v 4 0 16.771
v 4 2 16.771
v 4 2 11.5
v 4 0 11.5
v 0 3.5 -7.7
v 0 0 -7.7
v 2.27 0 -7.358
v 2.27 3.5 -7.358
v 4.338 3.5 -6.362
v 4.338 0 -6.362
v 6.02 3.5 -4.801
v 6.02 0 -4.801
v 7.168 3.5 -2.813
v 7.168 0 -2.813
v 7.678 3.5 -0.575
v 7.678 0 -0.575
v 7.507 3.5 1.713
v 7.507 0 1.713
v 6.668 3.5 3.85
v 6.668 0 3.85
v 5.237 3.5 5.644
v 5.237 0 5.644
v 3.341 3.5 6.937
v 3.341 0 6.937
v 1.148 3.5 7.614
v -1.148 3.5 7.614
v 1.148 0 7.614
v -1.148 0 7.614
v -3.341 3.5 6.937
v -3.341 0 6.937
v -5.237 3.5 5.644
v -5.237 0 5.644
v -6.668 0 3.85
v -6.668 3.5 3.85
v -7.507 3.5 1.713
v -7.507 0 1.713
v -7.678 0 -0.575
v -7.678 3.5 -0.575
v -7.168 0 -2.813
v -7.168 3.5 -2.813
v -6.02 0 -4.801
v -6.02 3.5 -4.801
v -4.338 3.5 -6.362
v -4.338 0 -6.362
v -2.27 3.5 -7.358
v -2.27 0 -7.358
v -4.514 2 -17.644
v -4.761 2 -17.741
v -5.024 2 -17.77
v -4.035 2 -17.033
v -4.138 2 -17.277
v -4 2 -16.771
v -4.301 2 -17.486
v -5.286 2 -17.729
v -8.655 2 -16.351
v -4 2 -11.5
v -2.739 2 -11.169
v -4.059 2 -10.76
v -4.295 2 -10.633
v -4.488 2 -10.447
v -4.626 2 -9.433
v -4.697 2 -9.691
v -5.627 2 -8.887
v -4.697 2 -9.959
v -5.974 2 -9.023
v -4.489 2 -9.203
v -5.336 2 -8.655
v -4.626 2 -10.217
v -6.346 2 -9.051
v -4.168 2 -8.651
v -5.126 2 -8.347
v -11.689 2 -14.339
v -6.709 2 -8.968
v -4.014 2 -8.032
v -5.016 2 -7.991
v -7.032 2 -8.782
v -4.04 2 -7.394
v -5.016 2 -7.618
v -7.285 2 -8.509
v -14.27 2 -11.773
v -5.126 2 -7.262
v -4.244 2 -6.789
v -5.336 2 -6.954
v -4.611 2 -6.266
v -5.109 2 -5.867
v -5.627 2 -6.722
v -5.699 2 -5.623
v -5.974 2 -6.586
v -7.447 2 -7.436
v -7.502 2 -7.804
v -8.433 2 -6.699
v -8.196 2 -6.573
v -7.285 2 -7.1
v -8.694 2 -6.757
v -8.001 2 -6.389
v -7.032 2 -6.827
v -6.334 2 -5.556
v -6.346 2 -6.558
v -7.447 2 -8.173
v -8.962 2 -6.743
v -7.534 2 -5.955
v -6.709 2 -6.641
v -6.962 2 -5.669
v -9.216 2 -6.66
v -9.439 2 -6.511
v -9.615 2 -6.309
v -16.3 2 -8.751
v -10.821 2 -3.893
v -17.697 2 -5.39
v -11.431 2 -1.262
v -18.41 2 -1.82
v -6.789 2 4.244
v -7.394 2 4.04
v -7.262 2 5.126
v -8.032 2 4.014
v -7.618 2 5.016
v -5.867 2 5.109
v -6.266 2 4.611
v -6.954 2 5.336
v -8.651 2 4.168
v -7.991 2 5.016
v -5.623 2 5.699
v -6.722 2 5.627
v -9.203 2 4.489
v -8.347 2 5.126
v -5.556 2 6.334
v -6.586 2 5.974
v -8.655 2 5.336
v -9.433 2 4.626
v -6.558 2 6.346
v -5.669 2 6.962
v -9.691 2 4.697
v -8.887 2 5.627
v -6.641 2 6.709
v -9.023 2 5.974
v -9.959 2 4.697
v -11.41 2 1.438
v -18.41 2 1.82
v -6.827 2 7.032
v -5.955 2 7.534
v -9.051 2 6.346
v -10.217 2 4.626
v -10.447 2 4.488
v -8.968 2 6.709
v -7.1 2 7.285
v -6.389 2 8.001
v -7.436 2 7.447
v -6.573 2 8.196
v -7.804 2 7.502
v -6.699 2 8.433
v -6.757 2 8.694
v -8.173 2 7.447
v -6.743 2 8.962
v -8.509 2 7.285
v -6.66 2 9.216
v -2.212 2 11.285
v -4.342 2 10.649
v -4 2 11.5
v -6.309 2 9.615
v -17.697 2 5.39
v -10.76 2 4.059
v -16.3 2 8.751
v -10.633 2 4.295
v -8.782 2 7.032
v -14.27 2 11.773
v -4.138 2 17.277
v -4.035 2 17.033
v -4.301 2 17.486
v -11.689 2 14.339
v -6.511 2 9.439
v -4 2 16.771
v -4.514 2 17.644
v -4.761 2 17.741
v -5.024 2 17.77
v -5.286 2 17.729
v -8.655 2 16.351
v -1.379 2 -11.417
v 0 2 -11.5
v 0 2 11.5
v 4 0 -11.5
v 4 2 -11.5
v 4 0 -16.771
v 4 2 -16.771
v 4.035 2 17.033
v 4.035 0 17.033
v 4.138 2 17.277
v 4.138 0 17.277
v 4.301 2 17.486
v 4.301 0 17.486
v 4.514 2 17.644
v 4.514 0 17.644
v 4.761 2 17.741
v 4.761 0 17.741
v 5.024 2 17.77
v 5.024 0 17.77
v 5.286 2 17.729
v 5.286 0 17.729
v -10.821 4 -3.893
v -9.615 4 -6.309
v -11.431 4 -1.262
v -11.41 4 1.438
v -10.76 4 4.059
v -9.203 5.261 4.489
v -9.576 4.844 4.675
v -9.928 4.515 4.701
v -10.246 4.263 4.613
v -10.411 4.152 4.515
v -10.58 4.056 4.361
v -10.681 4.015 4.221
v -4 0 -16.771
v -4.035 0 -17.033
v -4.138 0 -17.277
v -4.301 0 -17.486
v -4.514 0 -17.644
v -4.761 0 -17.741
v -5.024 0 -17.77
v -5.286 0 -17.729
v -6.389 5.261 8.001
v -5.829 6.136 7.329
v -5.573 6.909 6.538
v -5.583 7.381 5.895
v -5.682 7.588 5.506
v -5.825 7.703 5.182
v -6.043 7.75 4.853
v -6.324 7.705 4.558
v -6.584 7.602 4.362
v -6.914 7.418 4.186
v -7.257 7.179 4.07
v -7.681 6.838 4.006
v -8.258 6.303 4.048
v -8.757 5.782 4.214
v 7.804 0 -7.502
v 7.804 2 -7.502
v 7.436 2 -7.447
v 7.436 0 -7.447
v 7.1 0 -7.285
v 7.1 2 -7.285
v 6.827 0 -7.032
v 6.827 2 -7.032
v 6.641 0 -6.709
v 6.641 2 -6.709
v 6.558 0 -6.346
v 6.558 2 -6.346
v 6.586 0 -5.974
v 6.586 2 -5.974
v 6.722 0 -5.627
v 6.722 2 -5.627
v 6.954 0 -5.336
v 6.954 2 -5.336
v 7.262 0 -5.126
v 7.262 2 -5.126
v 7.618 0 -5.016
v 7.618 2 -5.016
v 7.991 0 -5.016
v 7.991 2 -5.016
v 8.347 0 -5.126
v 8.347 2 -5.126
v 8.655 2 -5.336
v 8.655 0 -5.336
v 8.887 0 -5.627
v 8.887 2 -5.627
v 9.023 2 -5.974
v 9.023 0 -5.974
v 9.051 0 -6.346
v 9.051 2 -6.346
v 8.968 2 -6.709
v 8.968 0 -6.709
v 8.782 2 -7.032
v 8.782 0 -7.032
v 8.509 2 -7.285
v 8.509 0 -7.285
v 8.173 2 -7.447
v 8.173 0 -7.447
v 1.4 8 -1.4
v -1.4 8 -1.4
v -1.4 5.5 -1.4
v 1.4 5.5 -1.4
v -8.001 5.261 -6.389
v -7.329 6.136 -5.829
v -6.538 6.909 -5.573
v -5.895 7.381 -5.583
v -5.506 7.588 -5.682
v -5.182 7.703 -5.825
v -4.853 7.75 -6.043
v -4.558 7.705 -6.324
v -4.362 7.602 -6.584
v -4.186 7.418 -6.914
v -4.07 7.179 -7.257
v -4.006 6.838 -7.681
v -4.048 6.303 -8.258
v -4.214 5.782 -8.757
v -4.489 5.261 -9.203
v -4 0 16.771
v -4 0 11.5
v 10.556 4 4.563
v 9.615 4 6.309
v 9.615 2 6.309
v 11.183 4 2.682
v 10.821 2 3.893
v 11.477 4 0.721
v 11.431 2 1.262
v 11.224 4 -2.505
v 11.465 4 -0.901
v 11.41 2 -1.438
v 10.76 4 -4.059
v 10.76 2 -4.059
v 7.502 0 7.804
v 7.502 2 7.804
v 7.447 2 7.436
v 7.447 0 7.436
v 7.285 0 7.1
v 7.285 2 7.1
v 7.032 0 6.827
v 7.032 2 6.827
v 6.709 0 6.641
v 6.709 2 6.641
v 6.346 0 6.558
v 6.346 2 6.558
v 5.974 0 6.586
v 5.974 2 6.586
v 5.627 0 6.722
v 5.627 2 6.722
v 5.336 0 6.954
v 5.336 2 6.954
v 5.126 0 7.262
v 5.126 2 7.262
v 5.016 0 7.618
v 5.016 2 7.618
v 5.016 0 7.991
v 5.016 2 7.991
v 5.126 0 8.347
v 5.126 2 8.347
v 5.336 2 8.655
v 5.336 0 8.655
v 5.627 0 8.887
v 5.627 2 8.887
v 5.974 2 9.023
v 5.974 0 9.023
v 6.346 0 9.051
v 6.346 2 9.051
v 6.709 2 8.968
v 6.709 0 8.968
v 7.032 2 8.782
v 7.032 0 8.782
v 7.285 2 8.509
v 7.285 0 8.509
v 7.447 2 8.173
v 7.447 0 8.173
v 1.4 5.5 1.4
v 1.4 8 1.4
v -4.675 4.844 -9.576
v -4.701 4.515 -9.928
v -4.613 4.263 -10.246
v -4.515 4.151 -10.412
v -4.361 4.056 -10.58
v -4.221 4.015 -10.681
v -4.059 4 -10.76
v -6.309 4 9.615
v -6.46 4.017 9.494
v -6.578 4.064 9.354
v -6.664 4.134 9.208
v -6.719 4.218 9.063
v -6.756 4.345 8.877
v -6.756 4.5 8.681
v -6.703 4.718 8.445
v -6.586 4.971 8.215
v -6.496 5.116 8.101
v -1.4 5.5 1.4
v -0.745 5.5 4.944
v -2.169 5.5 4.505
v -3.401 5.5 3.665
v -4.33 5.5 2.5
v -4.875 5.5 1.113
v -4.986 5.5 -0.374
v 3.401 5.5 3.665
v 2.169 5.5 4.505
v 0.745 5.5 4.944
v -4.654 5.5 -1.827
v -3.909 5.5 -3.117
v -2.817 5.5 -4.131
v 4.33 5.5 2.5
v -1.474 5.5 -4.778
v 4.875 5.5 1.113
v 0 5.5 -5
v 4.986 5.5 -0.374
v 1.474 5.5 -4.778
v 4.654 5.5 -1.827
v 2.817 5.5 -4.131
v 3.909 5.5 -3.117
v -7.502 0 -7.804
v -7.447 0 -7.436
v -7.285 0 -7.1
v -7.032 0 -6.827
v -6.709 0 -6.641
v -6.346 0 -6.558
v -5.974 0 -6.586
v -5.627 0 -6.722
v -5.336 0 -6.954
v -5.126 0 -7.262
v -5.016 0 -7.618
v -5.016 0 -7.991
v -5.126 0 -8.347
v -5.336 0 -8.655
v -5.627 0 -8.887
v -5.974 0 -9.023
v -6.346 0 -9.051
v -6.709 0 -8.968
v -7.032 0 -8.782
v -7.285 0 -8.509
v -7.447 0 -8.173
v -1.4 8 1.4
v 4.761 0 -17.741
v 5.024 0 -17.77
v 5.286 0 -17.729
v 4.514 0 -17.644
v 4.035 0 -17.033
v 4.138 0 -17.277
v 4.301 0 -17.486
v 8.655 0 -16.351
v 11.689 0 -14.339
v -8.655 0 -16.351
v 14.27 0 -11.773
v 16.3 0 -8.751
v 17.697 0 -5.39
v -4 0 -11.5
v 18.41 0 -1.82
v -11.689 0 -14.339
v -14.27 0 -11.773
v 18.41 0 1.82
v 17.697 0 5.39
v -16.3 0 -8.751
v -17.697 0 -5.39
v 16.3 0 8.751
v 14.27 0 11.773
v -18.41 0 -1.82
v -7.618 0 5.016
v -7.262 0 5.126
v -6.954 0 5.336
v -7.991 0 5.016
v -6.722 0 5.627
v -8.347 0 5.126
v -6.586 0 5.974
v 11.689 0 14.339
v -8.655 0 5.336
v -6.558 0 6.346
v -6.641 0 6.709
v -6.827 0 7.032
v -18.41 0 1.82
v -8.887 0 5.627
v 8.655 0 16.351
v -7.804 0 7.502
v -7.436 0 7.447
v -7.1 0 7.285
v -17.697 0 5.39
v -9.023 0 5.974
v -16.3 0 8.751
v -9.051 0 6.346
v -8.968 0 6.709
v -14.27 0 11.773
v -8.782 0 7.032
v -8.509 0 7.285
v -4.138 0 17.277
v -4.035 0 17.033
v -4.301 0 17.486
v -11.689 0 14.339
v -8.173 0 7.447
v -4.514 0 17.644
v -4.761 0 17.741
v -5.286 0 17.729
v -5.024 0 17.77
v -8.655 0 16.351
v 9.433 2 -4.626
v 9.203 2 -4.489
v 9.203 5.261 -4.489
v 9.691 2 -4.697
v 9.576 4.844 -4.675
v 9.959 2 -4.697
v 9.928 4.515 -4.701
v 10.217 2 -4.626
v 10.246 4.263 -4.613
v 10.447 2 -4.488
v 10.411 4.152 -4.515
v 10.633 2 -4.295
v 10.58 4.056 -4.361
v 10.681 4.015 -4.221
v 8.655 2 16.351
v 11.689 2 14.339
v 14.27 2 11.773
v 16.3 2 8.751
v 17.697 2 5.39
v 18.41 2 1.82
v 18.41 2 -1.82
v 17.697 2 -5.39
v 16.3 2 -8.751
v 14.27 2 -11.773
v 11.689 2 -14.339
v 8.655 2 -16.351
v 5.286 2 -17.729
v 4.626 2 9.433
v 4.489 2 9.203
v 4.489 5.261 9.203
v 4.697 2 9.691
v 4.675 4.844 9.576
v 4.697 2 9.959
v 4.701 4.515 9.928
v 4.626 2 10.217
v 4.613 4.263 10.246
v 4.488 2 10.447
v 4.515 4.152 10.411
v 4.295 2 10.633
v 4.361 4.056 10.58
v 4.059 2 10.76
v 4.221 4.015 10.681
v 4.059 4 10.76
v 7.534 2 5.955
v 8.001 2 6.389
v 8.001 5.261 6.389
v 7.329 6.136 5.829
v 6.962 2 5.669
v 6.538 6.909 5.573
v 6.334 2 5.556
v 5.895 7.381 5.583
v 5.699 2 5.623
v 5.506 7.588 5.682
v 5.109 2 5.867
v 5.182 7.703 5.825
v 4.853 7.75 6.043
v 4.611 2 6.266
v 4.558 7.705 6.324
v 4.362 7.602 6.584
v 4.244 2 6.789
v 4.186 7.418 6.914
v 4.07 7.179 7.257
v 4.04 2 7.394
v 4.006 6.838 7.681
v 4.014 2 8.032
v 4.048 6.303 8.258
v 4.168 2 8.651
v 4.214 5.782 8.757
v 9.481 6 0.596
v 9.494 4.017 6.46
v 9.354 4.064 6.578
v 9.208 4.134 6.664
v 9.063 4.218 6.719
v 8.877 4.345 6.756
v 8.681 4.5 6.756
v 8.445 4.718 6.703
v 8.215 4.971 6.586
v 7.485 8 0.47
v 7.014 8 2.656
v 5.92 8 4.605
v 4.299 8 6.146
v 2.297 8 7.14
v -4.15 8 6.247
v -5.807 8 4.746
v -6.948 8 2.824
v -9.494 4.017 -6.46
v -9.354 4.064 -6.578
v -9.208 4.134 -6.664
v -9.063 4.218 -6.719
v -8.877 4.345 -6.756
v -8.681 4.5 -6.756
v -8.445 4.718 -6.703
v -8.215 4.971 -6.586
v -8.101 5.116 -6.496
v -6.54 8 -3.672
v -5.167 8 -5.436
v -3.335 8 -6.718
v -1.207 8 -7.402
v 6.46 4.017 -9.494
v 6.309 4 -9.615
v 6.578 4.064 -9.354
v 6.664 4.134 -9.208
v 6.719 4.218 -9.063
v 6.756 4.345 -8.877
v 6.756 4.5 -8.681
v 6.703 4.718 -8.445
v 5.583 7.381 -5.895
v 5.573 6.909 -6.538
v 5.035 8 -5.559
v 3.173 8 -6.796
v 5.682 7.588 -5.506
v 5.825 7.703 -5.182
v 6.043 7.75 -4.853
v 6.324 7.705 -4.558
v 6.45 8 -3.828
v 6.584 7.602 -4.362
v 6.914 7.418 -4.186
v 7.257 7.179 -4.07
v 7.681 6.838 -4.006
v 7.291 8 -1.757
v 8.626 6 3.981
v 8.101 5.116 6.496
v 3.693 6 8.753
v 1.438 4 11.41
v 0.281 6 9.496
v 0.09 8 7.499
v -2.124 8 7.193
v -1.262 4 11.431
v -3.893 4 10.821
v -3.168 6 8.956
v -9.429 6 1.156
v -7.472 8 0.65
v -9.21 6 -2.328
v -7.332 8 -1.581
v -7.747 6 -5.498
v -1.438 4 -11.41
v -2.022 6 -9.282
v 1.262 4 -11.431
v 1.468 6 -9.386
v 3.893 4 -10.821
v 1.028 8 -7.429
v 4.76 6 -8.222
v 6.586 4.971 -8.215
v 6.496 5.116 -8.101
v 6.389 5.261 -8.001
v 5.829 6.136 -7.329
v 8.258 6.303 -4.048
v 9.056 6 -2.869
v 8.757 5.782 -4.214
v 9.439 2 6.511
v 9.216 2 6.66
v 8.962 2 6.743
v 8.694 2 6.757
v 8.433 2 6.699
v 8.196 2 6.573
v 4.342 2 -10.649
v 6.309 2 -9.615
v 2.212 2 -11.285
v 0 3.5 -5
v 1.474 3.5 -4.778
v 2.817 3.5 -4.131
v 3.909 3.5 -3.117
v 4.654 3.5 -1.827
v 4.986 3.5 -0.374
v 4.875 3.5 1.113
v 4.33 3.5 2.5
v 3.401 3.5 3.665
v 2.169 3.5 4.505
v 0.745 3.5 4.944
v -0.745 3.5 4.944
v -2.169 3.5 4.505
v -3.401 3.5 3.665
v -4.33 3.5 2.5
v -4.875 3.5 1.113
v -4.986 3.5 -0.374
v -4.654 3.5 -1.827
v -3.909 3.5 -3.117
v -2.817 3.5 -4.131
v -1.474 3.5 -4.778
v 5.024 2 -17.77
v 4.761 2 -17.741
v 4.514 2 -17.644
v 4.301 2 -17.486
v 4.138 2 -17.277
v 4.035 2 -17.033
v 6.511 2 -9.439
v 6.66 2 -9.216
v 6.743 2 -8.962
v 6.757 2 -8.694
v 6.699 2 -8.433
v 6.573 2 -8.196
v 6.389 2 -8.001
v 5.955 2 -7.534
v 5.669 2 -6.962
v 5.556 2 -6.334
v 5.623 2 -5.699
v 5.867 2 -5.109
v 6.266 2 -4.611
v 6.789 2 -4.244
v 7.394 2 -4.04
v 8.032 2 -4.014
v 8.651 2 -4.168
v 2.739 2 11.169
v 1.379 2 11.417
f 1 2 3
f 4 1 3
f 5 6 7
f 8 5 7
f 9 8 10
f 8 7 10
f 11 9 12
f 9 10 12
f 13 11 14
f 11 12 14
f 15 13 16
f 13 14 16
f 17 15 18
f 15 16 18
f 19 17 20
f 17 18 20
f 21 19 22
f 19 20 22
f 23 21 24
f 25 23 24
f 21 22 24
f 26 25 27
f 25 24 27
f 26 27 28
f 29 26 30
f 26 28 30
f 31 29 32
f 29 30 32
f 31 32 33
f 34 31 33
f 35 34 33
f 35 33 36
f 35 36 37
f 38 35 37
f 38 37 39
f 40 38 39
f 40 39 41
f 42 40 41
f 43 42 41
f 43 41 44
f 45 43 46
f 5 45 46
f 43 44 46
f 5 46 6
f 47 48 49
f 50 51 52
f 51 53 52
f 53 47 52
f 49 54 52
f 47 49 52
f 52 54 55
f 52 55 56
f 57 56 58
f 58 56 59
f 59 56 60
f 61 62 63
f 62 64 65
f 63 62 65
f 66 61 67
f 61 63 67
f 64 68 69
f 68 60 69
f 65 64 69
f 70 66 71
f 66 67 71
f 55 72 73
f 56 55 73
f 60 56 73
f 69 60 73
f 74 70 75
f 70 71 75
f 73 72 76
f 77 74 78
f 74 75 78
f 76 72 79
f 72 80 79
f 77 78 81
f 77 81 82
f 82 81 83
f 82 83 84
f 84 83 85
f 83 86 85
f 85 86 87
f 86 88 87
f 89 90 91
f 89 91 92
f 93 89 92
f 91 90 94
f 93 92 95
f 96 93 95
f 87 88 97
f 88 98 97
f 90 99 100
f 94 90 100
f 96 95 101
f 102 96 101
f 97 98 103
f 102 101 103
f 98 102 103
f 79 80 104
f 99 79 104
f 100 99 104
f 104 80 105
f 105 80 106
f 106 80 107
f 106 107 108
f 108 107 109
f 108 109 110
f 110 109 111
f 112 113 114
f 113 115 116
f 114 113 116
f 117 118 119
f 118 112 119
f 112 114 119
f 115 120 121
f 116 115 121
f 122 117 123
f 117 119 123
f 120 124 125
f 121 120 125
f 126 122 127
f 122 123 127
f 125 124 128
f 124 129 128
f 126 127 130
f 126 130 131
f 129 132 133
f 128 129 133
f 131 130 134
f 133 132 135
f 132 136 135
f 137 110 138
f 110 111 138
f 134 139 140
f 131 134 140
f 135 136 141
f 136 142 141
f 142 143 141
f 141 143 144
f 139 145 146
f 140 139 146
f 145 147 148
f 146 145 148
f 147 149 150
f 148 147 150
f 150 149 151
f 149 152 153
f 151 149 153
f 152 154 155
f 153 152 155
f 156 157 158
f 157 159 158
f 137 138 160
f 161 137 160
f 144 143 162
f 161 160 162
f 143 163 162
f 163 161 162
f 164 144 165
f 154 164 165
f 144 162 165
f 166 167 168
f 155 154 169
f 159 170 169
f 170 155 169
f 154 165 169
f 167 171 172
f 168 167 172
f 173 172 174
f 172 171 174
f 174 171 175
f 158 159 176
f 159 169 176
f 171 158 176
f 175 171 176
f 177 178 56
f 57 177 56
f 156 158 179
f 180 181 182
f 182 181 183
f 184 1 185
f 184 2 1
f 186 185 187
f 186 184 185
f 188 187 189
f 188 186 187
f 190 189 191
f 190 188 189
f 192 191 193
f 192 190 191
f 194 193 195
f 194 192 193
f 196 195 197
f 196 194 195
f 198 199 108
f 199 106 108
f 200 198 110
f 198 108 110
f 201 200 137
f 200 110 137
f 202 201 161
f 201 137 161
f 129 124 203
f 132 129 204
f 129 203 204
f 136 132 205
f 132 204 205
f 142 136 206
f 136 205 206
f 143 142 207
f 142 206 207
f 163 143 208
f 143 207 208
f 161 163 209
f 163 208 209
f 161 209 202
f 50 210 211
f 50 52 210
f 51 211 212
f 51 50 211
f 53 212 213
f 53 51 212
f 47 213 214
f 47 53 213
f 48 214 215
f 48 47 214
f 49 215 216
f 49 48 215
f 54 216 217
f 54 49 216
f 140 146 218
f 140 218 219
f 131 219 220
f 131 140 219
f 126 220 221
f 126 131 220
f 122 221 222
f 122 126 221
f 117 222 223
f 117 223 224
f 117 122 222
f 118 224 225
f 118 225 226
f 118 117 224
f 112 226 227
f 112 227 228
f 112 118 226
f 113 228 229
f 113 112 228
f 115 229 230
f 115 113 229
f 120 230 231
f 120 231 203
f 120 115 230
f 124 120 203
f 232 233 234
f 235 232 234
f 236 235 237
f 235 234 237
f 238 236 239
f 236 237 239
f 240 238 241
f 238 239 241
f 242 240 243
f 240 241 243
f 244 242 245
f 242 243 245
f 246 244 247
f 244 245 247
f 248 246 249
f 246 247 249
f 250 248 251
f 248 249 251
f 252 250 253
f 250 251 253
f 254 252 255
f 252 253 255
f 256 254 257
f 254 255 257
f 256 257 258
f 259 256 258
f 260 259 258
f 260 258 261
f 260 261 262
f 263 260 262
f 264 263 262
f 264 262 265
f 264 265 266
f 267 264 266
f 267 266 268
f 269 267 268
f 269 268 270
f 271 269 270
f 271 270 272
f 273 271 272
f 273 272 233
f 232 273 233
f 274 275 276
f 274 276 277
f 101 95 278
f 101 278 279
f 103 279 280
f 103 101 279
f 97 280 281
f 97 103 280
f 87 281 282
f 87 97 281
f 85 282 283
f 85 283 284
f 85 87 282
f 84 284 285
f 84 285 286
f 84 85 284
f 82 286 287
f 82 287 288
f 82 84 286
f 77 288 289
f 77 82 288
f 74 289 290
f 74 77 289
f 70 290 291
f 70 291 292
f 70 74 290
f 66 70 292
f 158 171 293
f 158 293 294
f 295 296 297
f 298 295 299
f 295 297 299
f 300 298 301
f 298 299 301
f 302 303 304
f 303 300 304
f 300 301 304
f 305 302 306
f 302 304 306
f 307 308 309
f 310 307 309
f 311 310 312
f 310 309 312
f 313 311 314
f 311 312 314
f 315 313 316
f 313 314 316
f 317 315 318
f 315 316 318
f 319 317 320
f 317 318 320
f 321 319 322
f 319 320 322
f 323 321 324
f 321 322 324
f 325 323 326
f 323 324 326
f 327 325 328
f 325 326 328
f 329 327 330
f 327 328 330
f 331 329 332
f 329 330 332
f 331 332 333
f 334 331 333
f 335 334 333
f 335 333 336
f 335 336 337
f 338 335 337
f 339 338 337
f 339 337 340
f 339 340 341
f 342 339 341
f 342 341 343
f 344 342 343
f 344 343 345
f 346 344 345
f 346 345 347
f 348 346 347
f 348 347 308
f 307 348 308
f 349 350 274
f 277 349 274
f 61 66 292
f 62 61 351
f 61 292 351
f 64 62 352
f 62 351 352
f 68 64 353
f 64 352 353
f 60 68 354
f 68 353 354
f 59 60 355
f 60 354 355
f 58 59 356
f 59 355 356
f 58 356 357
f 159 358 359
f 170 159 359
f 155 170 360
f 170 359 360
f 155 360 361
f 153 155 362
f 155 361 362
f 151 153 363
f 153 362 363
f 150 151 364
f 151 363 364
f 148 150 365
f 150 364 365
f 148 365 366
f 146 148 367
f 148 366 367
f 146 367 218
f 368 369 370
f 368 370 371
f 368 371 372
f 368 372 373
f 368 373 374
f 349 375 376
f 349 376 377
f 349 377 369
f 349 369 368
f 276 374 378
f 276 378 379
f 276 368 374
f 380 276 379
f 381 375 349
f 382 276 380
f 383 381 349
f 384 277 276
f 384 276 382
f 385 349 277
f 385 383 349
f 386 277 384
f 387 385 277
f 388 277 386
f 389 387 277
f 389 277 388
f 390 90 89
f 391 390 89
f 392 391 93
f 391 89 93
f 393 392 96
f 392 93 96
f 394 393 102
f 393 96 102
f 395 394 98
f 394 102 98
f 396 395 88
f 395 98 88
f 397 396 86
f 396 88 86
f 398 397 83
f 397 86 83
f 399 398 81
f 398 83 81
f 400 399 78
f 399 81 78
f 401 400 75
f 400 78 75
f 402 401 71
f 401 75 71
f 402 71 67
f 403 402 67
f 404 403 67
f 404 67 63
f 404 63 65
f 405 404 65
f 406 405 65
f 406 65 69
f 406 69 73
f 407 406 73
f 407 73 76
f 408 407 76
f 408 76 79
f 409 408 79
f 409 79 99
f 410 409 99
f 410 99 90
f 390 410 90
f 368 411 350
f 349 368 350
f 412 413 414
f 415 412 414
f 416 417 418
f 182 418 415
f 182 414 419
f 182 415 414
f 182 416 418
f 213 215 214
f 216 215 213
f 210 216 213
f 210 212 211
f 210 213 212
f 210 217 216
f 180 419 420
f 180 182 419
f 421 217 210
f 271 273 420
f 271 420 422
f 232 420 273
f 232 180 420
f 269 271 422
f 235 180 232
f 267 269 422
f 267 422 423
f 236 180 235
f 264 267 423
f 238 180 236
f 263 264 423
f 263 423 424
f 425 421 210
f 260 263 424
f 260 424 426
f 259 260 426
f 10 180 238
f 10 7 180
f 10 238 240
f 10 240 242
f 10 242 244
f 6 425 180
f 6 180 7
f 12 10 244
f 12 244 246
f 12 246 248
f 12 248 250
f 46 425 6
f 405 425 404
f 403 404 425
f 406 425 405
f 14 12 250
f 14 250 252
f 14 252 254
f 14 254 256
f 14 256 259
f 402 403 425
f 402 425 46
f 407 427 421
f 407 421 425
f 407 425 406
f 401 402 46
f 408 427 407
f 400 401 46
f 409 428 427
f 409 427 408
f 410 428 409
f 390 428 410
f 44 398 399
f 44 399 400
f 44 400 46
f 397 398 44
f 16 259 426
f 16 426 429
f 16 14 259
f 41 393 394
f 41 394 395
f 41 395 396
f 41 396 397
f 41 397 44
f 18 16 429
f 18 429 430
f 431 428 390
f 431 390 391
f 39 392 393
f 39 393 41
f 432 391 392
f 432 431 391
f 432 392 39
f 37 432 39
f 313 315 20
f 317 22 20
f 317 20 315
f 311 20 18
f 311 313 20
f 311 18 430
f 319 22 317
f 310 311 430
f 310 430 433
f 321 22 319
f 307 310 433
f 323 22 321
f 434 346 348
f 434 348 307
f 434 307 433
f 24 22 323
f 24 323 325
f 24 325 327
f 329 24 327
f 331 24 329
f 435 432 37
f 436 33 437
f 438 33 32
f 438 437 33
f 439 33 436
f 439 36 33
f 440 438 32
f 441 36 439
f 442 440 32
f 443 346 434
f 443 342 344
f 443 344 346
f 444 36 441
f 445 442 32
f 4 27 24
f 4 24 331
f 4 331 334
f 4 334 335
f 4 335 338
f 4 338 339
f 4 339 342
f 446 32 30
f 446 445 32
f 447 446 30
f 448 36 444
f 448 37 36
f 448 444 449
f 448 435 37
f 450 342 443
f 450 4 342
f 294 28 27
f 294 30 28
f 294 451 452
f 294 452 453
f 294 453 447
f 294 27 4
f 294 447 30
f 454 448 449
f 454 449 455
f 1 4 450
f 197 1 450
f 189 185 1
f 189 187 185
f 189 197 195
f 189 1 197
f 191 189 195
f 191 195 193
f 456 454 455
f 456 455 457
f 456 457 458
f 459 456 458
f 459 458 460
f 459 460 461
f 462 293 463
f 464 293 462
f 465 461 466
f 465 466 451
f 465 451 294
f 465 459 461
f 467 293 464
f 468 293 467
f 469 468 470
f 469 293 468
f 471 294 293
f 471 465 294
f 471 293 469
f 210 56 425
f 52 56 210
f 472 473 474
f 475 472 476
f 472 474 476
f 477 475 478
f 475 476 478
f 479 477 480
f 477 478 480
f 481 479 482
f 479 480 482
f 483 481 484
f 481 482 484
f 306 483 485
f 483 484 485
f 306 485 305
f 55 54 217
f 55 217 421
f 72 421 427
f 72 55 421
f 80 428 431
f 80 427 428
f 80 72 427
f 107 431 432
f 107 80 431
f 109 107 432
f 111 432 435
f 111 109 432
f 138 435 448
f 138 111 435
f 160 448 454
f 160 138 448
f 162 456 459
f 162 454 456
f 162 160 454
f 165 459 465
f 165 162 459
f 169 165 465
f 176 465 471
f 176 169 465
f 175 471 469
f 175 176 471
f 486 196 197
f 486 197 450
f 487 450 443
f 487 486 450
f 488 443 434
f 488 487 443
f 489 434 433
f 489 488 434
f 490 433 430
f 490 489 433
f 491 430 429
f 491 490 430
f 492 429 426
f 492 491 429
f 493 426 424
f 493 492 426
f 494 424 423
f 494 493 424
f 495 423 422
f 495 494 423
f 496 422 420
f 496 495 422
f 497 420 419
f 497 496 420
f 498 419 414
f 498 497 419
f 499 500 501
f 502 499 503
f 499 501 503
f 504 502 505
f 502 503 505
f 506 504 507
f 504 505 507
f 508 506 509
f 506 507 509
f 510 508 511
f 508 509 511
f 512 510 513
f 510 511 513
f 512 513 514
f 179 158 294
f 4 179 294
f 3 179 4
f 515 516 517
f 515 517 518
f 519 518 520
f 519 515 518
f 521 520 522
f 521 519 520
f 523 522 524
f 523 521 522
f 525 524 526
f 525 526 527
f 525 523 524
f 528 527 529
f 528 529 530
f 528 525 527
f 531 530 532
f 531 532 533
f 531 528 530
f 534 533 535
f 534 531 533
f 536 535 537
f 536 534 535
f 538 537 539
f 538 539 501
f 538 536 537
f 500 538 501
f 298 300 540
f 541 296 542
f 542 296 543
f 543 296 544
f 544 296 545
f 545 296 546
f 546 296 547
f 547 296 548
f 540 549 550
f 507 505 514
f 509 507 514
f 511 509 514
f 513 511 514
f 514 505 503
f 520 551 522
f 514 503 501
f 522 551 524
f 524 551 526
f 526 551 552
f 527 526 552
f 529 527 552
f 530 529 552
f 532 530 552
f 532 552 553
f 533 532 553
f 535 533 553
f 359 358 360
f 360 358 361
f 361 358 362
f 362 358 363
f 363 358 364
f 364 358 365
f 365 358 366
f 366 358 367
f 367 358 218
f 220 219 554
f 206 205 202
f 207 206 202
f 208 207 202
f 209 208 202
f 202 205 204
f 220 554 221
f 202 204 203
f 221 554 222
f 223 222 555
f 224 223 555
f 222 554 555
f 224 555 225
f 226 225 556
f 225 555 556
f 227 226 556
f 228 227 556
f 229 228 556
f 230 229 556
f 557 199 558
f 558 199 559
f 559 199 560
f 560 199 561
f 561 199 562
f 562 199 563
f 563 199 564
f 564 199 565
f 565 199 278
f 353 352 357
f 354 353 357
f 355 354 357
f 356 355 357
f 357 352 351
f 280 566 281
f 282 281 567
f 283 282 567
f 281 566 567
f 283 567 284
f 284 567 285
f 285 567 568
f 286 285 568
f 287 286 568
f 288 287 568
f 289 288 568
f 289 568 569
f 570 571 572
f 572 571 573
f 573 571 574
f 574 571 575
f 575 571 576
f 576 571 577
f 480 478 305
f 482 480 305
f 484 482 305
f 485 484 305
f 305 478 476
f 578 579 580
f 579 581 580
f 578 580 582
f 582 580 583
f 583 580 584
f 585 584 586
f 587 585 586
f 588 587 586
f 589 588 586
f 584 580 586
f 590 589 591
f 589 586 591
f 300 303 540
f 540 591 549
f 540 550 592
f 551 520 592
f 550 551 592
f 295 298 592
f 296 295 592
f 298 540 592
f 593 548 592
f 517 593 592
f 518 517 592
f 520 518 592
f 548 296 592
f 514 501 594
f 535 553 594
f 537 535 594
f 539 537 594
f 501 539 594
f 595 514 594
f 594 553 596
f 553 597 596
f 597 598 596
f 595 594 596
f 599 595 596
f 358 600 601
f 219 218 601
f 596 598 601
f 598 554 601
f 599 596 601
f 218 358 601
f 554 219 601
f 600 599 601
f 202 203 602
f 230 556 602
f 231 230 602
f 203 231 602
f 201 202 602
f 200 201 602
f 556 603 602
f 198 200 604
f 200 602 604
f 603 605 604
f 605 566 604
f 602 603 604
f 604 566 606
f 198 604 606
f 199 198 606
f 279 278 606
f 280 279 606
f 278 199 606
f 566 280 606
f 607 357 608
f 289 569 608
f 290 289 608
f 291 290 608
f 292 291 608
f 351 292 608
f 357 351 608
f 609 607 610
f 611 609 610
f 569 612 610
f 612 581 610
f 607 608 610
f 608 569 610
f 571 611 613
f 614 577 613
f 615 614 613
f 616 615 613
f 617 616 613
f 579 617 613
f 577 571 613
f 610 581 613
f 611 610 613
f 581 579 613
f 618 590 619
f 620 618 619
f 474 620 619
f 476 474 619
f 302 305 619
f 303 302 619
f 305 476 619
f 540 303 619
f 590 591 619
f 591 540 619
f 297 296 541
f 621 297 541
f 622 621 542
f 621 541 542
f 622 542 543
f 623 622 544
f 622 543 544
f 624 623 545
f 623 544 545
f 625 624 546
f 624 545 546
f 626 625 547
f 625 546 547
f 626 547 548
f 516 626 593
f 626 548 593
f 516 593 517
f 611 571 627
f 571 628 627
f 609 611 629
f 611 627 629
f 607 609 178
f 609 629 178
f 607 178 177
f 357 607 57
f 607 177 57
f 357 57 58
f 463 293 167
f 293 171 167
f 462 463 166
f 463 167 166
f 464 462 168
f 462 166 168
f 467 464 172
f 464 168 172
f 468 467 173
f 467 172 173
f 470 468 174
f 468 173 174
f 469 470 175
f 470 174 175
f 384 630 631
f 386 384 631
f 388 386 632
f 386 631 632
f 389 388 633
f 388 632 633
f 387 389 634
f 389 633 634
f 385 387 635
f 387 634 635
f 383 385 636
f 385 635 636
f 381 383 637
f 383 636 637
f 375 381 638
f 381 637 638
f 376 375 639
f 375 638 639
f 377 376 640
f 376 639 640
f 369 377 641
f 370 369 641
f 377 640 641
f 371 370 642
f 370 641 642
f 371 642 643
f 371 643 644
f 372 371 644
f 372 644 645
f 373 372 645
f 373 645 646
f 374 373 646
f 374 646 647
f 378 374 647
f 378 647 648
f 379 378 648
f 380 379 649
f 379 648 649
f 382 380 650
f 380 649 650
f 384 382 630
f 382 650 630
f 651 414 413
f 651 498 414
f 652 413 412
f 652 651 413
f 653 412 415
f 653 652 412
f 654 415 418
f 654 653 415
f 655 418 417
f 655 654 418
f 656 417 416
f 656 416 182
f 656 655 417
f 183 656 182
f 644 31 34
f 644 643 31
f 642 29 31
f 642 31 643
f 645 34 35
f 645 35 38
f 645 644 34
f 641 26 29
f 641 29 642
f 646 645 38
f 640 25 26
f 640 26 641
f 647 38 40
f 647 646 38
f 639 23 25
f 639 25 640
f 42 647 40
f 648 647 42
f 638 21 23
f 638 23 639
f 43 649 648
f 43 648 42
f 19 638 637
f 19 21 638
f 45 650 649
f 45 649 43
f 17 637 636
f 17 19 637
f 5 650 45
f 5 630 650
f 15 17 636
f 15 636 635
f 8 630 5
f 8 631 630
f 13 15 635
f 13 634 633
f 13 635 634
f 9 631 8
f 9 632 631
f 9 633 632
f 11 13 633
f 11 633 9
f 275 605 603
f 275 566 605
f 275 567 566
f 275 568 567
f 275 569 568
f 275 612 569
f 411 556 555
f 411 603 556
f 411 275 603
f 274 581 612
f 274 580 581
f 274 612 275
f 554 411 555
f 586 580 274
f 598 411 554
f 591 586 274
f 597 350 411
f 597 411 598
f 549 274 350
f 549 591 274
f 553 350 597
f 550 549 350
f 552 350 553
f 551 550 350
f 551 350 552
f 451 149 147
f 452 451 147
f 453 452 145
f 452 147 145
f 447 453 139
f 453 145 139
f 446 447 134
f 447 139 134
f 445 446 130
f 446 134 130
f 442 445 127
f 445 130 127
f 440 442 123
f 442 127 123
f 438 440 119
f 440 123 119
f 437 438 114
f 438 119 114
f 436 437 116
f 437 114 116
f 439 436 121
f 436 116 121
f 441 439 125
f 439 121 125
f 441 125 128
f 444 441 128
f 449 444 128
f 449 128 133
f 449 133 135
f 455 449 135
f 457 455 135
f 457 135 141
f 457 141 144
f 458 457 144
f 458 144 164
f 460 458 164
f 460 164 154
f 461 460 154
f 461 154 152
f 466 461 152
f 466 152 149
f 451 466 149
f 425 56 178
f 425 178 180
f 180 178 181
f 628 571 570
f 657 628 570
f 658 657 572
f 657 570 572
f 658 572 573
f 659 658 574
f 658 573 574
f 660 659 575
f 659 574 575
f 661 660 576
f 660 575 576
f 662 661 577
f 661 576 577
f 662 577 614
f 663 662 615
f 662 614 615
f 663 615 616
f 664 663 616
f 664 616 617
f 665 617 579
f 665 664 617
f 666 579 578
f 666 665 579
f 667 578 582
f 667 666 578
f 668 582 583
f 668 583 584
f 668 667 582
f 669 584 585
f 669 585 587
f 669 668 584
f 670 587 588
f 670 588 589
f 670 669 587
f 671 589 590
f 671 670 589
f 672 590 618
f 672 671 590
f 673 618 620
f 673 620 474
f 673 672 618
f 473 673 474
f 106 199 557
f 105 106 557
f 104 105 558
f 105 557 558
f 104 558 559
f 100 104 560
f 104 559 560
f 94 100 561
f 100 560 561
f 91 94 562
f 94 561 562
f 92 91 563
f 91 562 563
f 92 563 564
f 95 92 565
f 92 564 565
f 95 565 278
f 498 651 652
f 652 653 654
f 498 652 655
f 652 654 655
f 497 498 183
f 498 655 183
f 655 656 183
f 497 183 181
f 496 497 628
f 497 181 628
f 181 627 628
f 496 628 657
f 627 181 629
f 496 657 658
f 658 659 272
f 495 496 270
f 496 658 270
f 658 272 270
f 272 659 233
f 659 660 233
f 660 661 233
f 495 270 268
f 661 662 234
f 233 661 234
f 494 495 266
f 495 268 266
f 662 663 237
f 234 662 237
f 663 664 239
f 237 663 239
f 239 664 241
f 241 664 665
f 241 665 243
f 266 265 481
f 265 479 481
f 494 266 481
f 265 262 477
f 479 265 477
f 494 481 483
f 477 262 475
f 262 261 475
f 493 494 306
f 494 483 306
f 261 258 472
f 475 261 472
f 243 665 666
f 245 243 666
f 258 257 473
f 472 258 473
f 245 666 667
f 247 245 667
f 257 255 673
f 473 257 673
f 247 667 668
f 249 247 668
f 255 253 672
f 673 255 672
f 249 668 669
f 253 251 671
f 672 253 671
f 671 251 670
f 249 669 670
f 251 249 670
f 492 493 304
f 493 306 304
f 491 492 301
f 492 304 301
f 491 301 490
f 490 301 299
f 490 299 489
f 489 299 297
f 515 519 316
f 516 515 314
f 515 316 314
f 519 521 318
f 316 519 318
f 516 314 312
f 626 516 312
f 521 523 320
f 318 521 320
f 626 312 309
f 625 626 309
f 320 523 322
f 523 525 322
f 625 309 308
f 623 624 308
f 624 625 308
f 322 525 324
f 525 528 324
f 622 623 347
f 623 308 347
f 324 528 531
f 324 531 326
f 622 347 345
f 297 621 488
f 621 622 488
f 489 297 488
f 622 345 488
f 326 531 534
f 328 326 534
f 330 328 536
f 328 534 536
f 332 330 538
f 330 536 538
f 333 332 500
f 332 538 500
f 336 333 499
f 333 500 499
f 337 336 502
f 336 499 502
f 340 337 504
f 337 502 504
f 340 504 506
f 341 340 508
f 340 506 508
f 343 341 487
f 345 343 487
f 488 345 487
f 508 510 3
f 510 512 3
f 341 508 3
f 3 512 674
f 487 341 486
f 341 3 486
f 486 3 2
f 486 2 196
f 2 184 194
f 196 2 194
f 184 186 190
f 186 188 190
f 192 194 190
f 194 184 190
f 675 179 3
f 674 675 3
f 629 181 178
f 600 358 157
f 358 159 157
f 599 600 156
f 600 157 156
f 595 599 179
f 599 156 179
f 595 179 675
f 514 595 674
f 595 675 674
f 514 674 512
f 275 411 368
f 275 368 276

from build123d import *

# Parameters (mm, degrees)
SKETCH1_R             = 12.5
BOSS_EXTRUDE1_DEPTH   = 2
SKETCH2_R             = 11.5
BOSS_EXTRUDE2_DEPTH   = 6
F_2_5MM_DOWEL_HOLE1_D = 2.5
SKETCH7_R             = 2.25
CUT_EXTRUDE1_DEPTH    = 15
CIRPATTERN1_COUNT     = 4
SKETCH8_R             = 7.7
CUT_EXTRUDE2_DEPTH    = 3.5
CHAMFER4_SIZE         = 4
SKETCH3_W             = 2.8
SKETCH3_H             = 2.8
CUT_EXTRUDE3_DEPTH    = 20.403607912
SKETCH9_R             = 5
CUT_EXTRUDE4_DEPTH    = 2
FILLET1_R             = 1
SKETCH11_W            = 6
SKETCH11_H            = 2
SKETCH13_W            = 8
SKETCH13_H            = 10.327587527
CUT_EXTRUDE5_DEPTH    = 10
FILLET2_R             = 1


with BuildPart() as part:
    # Sketch1 → Boss-Extrude1 (new body)
    with BuildSketch(Plane(origin=(0, 0, 0), x_dir=(1, 0, 0), z_dir=(0, 1, 0))):
        with Locations(Location((0, 0, 0), (0, 0, 270))):
            Circle(SKETCH1_R)
    extrude(amount=BOSS_EXTRUDE1_DEPTH)

    # Sketch2 → Boss-Extrude2 (add)
    with BuildSketch(Plane(origin=(0, 2, 0), x_dir=(1, 0, 0), z_dir=(0, 1, 0))):
        with Locations(Location((0, 0, 0), (0, 0, 270))):
            Circle(SKETCH2_R)
    extrude(amount=BOSS_EXTRUDE2_DEPTH)

    # Ø2.5mm Dowel Hole1 (through all)
    with Locations(Plane(origin=(0, 0, 0), x_dir=(-1, 0, 0), z_dir=(0, -1, 0))):
        with Locations((-6.252229289, -7.804462116)):
            f_2_5mm_dowel_hole1 = Hole(F_2_5MM_DOWEL_HOLE1_D / 2)

    # Sketch7 → Cut-Extrude1 (cut)
    with BuildSketch(Plane(origin=(0, 2, 0), x_dir=(1, 0, 0), z_dir=(0, 1, 0))):
        with Locations((6.252229289, -7.804462116)):
            Circle(SKETCH7_R)
    cut_extrude1 = extrude(amount=CUT_EXTRUDE1_DEPTH, mode=Mode.SUBTRACT)

    # CirPattern1: Ø2.5mm Dowel Hole1, Cut-Extrude1 ×4 about axis
    cirpattern1_axis = Axis((0, 0, 0), (0, 1, 0))
    add([f_2_5mm_dowel_hole1.rotate(cirpattern1_axis, i * 360 / CIRPATTERN1_COUNT) for i in range(1, CIRPATTERN1_COUNT)], mode=Mode.SUBTRACT)
    add([cut_extrude1.rotate(cirpattern1_axis, i * 360 / CIRPATTERN1_COUNT) for i in range(1, CIRPATTERN1_COUNT)], mode=Mode.SUBTRACT)

    # Sketch8 → Cut-Extrude2 (cut)
    with BuildSketch(Plane.XZ):
        with Locations(Location((0, 0, 0), (0, 0, 270))):
            Circle(SKETCH8_R)
    extrude(amount=-CUT_EXTRUDE2_DEPTH, mode=Mode.SUBTRACT)

    # Chamfer4
    # the kernel refuses this chamfer: 4 mm, written as the material it takes off along each edge
    with BuildSketch(Plane(origin=(0, 8, 0), x_dir=(-0.15654942512802536, 0, 0.9876701258477371), z_dir=(0.9876701258477371, 0, 0.15654942512802536))) as chamfer4_piece_1:
        Polygon((11.5, CHAMFER4_SIZE), (11.5 - CHAMFER4_SIZE, 0), (11.5, 0), align=None)
    revolve(axis=Axis((0, 8, 0), (0, -1, 0)), revolution_arc=174.589558781, mode=Mode.SUBTRACT)
    with BuildSketch(Plane(origin=(0, 8, 0), x_dir=(0.9876701258477374, 0, 0.15654942512802353), z_dir=(0.15654942512802353, 0, -0.9876701258477374))) as chamfer4_piece_2:
        Polygon((11.5, CHAMFER4_SIZE), (11.5 - CHAMFER4_SIZE, 0), (11.5, 0), align=None)
    revolve(axis=Axis((0, 8, 0), (0, -1, 0)), revolution_arc=174.589558781, mode=Mode.SUBTRACT)
    with BuildSketch(Plane(origin=(0, 8, 0), x_dir=(-0.9876701258477374, 0, -0.15654942512802342), z_dir=(-0.15654942512802342, 0, 0.9876701258477374))) as chamfer4_piece_3:
        Polygon((11.5, CHAMFER4_SIZE), (11.5 - CHAMFER4_SIZE, 0), (11.5, 0), align=None)
    revolve(axis=Axis((0, 8, 0), (0, -1, 0)), revolution_arc=174.589558781, mode=Mode.SUBTRACT)
    with BuildSketch(Plane(origin=(0, 8, 0), x_dir=(0.15654942512802555, 0, -0.987670125847737), z_dir=(-0.987670125847737, 0, -0.15654942512802555))) as chamfer4_piece_4:
        Polygon((11.5, CHAMFER4_SIZE), (11.5 - CHAMFER4_SIZE, 0), (11.5, 0), align=None)
    revolve(axis=Axis((0, 8, 0), (0, -1, 0)), revolution_arc=174.589558781, mode=Mode.SUBTRACT)

    # Sketch3 → Cut-Extrude3 (cut, through all)
    with BuildSketch(Plane(origin=(0, 8, 0), x_dir=(1, 0, 0), z_dir=(0, 1, 0))):
        Rectangle(SKETCH3_W, SKETCH3_H)
    extrude(amount=-CUT_EXTRUDE3_DEPTH, mode=Mode.SUBTRACT)

    # Sketch9 → Cut-Extrude4 (cut)
    with BuildSketch(Plane.XZ.offset(-3.5)):
        with Locations(Location((0, 0, 0), (0, 0, 270))):
            Circle(SKETCH9_R)
    extrude(amount=-CUT_EXTRUDE4_DEPTH, mode=Mode.SUBTRACT)

    # Fillet1
    # the kernel refuses this fillet: 1 mm, written as the material it takes off along each edge
    with BuildSketch(Plane(origin=(-7.744399955, 8.541870217, 8.501427488), x_dir=(0.7901380360957252, 0, 0.6129289387154032), z_dir=(0, -1, 0)), Plane(origin=(-8.501427488, 8.541870217, -7.744399955), x_dir=(-0.6129289387154034, 0, 0.790138036095725), z_dir=(0, -1, 0)), Plane(origin=(8.501427488, 8.541870217, 7.744399955), x_dir=(0.6129289387154006, 0, -0.7901380360957272), z_dir=(0, -1, 0))) as fillet1_piece_1:
        with BuildLine():
            CenterArc((1.73775904, -0.996875484), FILLET1_R, 85.469541484, 107.754858312)
            ThreePointArc((0.76427747, -1.225640938), (0.48316298, -0.549824406), (0, 0))
            ThreePointArc((0, 0), (0.908374043, 0.035931935), (1.816748087, 0))
        make_face()
    extrude(amount=6.541870217, mode=Mode.SUBTRACT)
    with BuildSketch(Plane(origin=(-9.986362414, 8.541870217, 5.702855929), x_dir=(0.5425108766100752, 0, -0.840048777607448), z_dir=(0, -1, 0)), Plane(origin=(-5.702855929, 8.541870217, -9.986362414), x_dir=(0.8400487776074425, 0, 0.5425108766100841), z_dir=(0, -1, 0)), Plane(origin=(9.986362414, 8.541870217, -5.702855929), x_dir=(-0.5425108766100888, 0, 0.8400487776074392), z_dir=(0, -1, 0)), Plane(origin=(5.702855929, 8.541870217, 9.986362414), x_dir=(-0.8400487776074446, 0, -0.5425108766100806), z_dir=(0, -1, 0))) as fillet1_piece_2:
        with BuildLine():
            CenterArc((1.765388102, -0.94708609), FILLET1_R, 108.722180598, 107.754858312)
            ThreePointArc((0.961292932, -1.541586686), (0.450156717, -0.789805949), (0, 0))
            ThreePointArc((0, 0), (0.722204223, -0.119056298), (1.444408447, 0))
        make_face()
    extrude(amount=6.541870217, mode=Mode.SUBTRACT)
    with BuildSketch(Plane(origin=(7.744399955, 8.541870217, -8.501427488), x_dir=(-0.9381802645731545, 0, 0.34614706580505045), z_dir=(0, -1, 0))) as fillet1_piece_3:
        with BuildLine():
            CenterArc((1.765388102, 0.94708609), FILLET1_R, 143.52296109, 107.754858312)
            ThreePointArc((0.961292932, 1.541586686), (0.450156717, 0.789805949), (0, 0))
            ThreePointArc((0, 0), (0.722204223, 0.119056298), (1.444408447, 0))
        make_face()
    extrude(amount=6.541870217, mode=Mode.SUBTRACT)

    # Sketch11 → Revolve1 (revolve)
    with BuildSketch(Plane(origin=(0, 0, 0), x_dir=(0, 0, -1), z_dir=(1, 0, 0)), mode=Mode.PRIVATE) as revolve1_sk:
        with Locations((15.5, 1)):
            Rectangle(SKETCH11_W, SKETCH11_H)
    revolve(revolve1_sk.sketch.rotate(Axis((0, 0, 0), (0, 1, 0)), 20.668231864), axis=Axis((0, 0, 0), (0, 1, 0)))

    # Sketch13 → Cut-Extrude5 (cut)
    with BuildSketch(Plane(origin=(0, 2, 0), x_dir=(1, 0, 0), z_dir=(0, 1, 0))):
        with Locations((0, 16.663793764)):
            Rectangle(SKETCH13_W, SKETCH13_H)
        with Locations((0, -16.663793764)):
            Rectangle(SKETCH13_W, SKETCH13_H)
    extrude(amount=-CUT_EXTRUDE5_DEPTH, mode=Mode.SUBTRACT)

    # Fillet2
    fillet2_edges = [part.edges().sort_by_distance(p)[0] for p in [
        (-4, 1, -18.062391868),
        (4, 1, -18.062391868),
        (4, 1, 18.062391868),
        (-4, 1, 18.062391868),
    ]]
    fillet(fillet2_edges, radius=FILLET2_R)


solid = part.part
